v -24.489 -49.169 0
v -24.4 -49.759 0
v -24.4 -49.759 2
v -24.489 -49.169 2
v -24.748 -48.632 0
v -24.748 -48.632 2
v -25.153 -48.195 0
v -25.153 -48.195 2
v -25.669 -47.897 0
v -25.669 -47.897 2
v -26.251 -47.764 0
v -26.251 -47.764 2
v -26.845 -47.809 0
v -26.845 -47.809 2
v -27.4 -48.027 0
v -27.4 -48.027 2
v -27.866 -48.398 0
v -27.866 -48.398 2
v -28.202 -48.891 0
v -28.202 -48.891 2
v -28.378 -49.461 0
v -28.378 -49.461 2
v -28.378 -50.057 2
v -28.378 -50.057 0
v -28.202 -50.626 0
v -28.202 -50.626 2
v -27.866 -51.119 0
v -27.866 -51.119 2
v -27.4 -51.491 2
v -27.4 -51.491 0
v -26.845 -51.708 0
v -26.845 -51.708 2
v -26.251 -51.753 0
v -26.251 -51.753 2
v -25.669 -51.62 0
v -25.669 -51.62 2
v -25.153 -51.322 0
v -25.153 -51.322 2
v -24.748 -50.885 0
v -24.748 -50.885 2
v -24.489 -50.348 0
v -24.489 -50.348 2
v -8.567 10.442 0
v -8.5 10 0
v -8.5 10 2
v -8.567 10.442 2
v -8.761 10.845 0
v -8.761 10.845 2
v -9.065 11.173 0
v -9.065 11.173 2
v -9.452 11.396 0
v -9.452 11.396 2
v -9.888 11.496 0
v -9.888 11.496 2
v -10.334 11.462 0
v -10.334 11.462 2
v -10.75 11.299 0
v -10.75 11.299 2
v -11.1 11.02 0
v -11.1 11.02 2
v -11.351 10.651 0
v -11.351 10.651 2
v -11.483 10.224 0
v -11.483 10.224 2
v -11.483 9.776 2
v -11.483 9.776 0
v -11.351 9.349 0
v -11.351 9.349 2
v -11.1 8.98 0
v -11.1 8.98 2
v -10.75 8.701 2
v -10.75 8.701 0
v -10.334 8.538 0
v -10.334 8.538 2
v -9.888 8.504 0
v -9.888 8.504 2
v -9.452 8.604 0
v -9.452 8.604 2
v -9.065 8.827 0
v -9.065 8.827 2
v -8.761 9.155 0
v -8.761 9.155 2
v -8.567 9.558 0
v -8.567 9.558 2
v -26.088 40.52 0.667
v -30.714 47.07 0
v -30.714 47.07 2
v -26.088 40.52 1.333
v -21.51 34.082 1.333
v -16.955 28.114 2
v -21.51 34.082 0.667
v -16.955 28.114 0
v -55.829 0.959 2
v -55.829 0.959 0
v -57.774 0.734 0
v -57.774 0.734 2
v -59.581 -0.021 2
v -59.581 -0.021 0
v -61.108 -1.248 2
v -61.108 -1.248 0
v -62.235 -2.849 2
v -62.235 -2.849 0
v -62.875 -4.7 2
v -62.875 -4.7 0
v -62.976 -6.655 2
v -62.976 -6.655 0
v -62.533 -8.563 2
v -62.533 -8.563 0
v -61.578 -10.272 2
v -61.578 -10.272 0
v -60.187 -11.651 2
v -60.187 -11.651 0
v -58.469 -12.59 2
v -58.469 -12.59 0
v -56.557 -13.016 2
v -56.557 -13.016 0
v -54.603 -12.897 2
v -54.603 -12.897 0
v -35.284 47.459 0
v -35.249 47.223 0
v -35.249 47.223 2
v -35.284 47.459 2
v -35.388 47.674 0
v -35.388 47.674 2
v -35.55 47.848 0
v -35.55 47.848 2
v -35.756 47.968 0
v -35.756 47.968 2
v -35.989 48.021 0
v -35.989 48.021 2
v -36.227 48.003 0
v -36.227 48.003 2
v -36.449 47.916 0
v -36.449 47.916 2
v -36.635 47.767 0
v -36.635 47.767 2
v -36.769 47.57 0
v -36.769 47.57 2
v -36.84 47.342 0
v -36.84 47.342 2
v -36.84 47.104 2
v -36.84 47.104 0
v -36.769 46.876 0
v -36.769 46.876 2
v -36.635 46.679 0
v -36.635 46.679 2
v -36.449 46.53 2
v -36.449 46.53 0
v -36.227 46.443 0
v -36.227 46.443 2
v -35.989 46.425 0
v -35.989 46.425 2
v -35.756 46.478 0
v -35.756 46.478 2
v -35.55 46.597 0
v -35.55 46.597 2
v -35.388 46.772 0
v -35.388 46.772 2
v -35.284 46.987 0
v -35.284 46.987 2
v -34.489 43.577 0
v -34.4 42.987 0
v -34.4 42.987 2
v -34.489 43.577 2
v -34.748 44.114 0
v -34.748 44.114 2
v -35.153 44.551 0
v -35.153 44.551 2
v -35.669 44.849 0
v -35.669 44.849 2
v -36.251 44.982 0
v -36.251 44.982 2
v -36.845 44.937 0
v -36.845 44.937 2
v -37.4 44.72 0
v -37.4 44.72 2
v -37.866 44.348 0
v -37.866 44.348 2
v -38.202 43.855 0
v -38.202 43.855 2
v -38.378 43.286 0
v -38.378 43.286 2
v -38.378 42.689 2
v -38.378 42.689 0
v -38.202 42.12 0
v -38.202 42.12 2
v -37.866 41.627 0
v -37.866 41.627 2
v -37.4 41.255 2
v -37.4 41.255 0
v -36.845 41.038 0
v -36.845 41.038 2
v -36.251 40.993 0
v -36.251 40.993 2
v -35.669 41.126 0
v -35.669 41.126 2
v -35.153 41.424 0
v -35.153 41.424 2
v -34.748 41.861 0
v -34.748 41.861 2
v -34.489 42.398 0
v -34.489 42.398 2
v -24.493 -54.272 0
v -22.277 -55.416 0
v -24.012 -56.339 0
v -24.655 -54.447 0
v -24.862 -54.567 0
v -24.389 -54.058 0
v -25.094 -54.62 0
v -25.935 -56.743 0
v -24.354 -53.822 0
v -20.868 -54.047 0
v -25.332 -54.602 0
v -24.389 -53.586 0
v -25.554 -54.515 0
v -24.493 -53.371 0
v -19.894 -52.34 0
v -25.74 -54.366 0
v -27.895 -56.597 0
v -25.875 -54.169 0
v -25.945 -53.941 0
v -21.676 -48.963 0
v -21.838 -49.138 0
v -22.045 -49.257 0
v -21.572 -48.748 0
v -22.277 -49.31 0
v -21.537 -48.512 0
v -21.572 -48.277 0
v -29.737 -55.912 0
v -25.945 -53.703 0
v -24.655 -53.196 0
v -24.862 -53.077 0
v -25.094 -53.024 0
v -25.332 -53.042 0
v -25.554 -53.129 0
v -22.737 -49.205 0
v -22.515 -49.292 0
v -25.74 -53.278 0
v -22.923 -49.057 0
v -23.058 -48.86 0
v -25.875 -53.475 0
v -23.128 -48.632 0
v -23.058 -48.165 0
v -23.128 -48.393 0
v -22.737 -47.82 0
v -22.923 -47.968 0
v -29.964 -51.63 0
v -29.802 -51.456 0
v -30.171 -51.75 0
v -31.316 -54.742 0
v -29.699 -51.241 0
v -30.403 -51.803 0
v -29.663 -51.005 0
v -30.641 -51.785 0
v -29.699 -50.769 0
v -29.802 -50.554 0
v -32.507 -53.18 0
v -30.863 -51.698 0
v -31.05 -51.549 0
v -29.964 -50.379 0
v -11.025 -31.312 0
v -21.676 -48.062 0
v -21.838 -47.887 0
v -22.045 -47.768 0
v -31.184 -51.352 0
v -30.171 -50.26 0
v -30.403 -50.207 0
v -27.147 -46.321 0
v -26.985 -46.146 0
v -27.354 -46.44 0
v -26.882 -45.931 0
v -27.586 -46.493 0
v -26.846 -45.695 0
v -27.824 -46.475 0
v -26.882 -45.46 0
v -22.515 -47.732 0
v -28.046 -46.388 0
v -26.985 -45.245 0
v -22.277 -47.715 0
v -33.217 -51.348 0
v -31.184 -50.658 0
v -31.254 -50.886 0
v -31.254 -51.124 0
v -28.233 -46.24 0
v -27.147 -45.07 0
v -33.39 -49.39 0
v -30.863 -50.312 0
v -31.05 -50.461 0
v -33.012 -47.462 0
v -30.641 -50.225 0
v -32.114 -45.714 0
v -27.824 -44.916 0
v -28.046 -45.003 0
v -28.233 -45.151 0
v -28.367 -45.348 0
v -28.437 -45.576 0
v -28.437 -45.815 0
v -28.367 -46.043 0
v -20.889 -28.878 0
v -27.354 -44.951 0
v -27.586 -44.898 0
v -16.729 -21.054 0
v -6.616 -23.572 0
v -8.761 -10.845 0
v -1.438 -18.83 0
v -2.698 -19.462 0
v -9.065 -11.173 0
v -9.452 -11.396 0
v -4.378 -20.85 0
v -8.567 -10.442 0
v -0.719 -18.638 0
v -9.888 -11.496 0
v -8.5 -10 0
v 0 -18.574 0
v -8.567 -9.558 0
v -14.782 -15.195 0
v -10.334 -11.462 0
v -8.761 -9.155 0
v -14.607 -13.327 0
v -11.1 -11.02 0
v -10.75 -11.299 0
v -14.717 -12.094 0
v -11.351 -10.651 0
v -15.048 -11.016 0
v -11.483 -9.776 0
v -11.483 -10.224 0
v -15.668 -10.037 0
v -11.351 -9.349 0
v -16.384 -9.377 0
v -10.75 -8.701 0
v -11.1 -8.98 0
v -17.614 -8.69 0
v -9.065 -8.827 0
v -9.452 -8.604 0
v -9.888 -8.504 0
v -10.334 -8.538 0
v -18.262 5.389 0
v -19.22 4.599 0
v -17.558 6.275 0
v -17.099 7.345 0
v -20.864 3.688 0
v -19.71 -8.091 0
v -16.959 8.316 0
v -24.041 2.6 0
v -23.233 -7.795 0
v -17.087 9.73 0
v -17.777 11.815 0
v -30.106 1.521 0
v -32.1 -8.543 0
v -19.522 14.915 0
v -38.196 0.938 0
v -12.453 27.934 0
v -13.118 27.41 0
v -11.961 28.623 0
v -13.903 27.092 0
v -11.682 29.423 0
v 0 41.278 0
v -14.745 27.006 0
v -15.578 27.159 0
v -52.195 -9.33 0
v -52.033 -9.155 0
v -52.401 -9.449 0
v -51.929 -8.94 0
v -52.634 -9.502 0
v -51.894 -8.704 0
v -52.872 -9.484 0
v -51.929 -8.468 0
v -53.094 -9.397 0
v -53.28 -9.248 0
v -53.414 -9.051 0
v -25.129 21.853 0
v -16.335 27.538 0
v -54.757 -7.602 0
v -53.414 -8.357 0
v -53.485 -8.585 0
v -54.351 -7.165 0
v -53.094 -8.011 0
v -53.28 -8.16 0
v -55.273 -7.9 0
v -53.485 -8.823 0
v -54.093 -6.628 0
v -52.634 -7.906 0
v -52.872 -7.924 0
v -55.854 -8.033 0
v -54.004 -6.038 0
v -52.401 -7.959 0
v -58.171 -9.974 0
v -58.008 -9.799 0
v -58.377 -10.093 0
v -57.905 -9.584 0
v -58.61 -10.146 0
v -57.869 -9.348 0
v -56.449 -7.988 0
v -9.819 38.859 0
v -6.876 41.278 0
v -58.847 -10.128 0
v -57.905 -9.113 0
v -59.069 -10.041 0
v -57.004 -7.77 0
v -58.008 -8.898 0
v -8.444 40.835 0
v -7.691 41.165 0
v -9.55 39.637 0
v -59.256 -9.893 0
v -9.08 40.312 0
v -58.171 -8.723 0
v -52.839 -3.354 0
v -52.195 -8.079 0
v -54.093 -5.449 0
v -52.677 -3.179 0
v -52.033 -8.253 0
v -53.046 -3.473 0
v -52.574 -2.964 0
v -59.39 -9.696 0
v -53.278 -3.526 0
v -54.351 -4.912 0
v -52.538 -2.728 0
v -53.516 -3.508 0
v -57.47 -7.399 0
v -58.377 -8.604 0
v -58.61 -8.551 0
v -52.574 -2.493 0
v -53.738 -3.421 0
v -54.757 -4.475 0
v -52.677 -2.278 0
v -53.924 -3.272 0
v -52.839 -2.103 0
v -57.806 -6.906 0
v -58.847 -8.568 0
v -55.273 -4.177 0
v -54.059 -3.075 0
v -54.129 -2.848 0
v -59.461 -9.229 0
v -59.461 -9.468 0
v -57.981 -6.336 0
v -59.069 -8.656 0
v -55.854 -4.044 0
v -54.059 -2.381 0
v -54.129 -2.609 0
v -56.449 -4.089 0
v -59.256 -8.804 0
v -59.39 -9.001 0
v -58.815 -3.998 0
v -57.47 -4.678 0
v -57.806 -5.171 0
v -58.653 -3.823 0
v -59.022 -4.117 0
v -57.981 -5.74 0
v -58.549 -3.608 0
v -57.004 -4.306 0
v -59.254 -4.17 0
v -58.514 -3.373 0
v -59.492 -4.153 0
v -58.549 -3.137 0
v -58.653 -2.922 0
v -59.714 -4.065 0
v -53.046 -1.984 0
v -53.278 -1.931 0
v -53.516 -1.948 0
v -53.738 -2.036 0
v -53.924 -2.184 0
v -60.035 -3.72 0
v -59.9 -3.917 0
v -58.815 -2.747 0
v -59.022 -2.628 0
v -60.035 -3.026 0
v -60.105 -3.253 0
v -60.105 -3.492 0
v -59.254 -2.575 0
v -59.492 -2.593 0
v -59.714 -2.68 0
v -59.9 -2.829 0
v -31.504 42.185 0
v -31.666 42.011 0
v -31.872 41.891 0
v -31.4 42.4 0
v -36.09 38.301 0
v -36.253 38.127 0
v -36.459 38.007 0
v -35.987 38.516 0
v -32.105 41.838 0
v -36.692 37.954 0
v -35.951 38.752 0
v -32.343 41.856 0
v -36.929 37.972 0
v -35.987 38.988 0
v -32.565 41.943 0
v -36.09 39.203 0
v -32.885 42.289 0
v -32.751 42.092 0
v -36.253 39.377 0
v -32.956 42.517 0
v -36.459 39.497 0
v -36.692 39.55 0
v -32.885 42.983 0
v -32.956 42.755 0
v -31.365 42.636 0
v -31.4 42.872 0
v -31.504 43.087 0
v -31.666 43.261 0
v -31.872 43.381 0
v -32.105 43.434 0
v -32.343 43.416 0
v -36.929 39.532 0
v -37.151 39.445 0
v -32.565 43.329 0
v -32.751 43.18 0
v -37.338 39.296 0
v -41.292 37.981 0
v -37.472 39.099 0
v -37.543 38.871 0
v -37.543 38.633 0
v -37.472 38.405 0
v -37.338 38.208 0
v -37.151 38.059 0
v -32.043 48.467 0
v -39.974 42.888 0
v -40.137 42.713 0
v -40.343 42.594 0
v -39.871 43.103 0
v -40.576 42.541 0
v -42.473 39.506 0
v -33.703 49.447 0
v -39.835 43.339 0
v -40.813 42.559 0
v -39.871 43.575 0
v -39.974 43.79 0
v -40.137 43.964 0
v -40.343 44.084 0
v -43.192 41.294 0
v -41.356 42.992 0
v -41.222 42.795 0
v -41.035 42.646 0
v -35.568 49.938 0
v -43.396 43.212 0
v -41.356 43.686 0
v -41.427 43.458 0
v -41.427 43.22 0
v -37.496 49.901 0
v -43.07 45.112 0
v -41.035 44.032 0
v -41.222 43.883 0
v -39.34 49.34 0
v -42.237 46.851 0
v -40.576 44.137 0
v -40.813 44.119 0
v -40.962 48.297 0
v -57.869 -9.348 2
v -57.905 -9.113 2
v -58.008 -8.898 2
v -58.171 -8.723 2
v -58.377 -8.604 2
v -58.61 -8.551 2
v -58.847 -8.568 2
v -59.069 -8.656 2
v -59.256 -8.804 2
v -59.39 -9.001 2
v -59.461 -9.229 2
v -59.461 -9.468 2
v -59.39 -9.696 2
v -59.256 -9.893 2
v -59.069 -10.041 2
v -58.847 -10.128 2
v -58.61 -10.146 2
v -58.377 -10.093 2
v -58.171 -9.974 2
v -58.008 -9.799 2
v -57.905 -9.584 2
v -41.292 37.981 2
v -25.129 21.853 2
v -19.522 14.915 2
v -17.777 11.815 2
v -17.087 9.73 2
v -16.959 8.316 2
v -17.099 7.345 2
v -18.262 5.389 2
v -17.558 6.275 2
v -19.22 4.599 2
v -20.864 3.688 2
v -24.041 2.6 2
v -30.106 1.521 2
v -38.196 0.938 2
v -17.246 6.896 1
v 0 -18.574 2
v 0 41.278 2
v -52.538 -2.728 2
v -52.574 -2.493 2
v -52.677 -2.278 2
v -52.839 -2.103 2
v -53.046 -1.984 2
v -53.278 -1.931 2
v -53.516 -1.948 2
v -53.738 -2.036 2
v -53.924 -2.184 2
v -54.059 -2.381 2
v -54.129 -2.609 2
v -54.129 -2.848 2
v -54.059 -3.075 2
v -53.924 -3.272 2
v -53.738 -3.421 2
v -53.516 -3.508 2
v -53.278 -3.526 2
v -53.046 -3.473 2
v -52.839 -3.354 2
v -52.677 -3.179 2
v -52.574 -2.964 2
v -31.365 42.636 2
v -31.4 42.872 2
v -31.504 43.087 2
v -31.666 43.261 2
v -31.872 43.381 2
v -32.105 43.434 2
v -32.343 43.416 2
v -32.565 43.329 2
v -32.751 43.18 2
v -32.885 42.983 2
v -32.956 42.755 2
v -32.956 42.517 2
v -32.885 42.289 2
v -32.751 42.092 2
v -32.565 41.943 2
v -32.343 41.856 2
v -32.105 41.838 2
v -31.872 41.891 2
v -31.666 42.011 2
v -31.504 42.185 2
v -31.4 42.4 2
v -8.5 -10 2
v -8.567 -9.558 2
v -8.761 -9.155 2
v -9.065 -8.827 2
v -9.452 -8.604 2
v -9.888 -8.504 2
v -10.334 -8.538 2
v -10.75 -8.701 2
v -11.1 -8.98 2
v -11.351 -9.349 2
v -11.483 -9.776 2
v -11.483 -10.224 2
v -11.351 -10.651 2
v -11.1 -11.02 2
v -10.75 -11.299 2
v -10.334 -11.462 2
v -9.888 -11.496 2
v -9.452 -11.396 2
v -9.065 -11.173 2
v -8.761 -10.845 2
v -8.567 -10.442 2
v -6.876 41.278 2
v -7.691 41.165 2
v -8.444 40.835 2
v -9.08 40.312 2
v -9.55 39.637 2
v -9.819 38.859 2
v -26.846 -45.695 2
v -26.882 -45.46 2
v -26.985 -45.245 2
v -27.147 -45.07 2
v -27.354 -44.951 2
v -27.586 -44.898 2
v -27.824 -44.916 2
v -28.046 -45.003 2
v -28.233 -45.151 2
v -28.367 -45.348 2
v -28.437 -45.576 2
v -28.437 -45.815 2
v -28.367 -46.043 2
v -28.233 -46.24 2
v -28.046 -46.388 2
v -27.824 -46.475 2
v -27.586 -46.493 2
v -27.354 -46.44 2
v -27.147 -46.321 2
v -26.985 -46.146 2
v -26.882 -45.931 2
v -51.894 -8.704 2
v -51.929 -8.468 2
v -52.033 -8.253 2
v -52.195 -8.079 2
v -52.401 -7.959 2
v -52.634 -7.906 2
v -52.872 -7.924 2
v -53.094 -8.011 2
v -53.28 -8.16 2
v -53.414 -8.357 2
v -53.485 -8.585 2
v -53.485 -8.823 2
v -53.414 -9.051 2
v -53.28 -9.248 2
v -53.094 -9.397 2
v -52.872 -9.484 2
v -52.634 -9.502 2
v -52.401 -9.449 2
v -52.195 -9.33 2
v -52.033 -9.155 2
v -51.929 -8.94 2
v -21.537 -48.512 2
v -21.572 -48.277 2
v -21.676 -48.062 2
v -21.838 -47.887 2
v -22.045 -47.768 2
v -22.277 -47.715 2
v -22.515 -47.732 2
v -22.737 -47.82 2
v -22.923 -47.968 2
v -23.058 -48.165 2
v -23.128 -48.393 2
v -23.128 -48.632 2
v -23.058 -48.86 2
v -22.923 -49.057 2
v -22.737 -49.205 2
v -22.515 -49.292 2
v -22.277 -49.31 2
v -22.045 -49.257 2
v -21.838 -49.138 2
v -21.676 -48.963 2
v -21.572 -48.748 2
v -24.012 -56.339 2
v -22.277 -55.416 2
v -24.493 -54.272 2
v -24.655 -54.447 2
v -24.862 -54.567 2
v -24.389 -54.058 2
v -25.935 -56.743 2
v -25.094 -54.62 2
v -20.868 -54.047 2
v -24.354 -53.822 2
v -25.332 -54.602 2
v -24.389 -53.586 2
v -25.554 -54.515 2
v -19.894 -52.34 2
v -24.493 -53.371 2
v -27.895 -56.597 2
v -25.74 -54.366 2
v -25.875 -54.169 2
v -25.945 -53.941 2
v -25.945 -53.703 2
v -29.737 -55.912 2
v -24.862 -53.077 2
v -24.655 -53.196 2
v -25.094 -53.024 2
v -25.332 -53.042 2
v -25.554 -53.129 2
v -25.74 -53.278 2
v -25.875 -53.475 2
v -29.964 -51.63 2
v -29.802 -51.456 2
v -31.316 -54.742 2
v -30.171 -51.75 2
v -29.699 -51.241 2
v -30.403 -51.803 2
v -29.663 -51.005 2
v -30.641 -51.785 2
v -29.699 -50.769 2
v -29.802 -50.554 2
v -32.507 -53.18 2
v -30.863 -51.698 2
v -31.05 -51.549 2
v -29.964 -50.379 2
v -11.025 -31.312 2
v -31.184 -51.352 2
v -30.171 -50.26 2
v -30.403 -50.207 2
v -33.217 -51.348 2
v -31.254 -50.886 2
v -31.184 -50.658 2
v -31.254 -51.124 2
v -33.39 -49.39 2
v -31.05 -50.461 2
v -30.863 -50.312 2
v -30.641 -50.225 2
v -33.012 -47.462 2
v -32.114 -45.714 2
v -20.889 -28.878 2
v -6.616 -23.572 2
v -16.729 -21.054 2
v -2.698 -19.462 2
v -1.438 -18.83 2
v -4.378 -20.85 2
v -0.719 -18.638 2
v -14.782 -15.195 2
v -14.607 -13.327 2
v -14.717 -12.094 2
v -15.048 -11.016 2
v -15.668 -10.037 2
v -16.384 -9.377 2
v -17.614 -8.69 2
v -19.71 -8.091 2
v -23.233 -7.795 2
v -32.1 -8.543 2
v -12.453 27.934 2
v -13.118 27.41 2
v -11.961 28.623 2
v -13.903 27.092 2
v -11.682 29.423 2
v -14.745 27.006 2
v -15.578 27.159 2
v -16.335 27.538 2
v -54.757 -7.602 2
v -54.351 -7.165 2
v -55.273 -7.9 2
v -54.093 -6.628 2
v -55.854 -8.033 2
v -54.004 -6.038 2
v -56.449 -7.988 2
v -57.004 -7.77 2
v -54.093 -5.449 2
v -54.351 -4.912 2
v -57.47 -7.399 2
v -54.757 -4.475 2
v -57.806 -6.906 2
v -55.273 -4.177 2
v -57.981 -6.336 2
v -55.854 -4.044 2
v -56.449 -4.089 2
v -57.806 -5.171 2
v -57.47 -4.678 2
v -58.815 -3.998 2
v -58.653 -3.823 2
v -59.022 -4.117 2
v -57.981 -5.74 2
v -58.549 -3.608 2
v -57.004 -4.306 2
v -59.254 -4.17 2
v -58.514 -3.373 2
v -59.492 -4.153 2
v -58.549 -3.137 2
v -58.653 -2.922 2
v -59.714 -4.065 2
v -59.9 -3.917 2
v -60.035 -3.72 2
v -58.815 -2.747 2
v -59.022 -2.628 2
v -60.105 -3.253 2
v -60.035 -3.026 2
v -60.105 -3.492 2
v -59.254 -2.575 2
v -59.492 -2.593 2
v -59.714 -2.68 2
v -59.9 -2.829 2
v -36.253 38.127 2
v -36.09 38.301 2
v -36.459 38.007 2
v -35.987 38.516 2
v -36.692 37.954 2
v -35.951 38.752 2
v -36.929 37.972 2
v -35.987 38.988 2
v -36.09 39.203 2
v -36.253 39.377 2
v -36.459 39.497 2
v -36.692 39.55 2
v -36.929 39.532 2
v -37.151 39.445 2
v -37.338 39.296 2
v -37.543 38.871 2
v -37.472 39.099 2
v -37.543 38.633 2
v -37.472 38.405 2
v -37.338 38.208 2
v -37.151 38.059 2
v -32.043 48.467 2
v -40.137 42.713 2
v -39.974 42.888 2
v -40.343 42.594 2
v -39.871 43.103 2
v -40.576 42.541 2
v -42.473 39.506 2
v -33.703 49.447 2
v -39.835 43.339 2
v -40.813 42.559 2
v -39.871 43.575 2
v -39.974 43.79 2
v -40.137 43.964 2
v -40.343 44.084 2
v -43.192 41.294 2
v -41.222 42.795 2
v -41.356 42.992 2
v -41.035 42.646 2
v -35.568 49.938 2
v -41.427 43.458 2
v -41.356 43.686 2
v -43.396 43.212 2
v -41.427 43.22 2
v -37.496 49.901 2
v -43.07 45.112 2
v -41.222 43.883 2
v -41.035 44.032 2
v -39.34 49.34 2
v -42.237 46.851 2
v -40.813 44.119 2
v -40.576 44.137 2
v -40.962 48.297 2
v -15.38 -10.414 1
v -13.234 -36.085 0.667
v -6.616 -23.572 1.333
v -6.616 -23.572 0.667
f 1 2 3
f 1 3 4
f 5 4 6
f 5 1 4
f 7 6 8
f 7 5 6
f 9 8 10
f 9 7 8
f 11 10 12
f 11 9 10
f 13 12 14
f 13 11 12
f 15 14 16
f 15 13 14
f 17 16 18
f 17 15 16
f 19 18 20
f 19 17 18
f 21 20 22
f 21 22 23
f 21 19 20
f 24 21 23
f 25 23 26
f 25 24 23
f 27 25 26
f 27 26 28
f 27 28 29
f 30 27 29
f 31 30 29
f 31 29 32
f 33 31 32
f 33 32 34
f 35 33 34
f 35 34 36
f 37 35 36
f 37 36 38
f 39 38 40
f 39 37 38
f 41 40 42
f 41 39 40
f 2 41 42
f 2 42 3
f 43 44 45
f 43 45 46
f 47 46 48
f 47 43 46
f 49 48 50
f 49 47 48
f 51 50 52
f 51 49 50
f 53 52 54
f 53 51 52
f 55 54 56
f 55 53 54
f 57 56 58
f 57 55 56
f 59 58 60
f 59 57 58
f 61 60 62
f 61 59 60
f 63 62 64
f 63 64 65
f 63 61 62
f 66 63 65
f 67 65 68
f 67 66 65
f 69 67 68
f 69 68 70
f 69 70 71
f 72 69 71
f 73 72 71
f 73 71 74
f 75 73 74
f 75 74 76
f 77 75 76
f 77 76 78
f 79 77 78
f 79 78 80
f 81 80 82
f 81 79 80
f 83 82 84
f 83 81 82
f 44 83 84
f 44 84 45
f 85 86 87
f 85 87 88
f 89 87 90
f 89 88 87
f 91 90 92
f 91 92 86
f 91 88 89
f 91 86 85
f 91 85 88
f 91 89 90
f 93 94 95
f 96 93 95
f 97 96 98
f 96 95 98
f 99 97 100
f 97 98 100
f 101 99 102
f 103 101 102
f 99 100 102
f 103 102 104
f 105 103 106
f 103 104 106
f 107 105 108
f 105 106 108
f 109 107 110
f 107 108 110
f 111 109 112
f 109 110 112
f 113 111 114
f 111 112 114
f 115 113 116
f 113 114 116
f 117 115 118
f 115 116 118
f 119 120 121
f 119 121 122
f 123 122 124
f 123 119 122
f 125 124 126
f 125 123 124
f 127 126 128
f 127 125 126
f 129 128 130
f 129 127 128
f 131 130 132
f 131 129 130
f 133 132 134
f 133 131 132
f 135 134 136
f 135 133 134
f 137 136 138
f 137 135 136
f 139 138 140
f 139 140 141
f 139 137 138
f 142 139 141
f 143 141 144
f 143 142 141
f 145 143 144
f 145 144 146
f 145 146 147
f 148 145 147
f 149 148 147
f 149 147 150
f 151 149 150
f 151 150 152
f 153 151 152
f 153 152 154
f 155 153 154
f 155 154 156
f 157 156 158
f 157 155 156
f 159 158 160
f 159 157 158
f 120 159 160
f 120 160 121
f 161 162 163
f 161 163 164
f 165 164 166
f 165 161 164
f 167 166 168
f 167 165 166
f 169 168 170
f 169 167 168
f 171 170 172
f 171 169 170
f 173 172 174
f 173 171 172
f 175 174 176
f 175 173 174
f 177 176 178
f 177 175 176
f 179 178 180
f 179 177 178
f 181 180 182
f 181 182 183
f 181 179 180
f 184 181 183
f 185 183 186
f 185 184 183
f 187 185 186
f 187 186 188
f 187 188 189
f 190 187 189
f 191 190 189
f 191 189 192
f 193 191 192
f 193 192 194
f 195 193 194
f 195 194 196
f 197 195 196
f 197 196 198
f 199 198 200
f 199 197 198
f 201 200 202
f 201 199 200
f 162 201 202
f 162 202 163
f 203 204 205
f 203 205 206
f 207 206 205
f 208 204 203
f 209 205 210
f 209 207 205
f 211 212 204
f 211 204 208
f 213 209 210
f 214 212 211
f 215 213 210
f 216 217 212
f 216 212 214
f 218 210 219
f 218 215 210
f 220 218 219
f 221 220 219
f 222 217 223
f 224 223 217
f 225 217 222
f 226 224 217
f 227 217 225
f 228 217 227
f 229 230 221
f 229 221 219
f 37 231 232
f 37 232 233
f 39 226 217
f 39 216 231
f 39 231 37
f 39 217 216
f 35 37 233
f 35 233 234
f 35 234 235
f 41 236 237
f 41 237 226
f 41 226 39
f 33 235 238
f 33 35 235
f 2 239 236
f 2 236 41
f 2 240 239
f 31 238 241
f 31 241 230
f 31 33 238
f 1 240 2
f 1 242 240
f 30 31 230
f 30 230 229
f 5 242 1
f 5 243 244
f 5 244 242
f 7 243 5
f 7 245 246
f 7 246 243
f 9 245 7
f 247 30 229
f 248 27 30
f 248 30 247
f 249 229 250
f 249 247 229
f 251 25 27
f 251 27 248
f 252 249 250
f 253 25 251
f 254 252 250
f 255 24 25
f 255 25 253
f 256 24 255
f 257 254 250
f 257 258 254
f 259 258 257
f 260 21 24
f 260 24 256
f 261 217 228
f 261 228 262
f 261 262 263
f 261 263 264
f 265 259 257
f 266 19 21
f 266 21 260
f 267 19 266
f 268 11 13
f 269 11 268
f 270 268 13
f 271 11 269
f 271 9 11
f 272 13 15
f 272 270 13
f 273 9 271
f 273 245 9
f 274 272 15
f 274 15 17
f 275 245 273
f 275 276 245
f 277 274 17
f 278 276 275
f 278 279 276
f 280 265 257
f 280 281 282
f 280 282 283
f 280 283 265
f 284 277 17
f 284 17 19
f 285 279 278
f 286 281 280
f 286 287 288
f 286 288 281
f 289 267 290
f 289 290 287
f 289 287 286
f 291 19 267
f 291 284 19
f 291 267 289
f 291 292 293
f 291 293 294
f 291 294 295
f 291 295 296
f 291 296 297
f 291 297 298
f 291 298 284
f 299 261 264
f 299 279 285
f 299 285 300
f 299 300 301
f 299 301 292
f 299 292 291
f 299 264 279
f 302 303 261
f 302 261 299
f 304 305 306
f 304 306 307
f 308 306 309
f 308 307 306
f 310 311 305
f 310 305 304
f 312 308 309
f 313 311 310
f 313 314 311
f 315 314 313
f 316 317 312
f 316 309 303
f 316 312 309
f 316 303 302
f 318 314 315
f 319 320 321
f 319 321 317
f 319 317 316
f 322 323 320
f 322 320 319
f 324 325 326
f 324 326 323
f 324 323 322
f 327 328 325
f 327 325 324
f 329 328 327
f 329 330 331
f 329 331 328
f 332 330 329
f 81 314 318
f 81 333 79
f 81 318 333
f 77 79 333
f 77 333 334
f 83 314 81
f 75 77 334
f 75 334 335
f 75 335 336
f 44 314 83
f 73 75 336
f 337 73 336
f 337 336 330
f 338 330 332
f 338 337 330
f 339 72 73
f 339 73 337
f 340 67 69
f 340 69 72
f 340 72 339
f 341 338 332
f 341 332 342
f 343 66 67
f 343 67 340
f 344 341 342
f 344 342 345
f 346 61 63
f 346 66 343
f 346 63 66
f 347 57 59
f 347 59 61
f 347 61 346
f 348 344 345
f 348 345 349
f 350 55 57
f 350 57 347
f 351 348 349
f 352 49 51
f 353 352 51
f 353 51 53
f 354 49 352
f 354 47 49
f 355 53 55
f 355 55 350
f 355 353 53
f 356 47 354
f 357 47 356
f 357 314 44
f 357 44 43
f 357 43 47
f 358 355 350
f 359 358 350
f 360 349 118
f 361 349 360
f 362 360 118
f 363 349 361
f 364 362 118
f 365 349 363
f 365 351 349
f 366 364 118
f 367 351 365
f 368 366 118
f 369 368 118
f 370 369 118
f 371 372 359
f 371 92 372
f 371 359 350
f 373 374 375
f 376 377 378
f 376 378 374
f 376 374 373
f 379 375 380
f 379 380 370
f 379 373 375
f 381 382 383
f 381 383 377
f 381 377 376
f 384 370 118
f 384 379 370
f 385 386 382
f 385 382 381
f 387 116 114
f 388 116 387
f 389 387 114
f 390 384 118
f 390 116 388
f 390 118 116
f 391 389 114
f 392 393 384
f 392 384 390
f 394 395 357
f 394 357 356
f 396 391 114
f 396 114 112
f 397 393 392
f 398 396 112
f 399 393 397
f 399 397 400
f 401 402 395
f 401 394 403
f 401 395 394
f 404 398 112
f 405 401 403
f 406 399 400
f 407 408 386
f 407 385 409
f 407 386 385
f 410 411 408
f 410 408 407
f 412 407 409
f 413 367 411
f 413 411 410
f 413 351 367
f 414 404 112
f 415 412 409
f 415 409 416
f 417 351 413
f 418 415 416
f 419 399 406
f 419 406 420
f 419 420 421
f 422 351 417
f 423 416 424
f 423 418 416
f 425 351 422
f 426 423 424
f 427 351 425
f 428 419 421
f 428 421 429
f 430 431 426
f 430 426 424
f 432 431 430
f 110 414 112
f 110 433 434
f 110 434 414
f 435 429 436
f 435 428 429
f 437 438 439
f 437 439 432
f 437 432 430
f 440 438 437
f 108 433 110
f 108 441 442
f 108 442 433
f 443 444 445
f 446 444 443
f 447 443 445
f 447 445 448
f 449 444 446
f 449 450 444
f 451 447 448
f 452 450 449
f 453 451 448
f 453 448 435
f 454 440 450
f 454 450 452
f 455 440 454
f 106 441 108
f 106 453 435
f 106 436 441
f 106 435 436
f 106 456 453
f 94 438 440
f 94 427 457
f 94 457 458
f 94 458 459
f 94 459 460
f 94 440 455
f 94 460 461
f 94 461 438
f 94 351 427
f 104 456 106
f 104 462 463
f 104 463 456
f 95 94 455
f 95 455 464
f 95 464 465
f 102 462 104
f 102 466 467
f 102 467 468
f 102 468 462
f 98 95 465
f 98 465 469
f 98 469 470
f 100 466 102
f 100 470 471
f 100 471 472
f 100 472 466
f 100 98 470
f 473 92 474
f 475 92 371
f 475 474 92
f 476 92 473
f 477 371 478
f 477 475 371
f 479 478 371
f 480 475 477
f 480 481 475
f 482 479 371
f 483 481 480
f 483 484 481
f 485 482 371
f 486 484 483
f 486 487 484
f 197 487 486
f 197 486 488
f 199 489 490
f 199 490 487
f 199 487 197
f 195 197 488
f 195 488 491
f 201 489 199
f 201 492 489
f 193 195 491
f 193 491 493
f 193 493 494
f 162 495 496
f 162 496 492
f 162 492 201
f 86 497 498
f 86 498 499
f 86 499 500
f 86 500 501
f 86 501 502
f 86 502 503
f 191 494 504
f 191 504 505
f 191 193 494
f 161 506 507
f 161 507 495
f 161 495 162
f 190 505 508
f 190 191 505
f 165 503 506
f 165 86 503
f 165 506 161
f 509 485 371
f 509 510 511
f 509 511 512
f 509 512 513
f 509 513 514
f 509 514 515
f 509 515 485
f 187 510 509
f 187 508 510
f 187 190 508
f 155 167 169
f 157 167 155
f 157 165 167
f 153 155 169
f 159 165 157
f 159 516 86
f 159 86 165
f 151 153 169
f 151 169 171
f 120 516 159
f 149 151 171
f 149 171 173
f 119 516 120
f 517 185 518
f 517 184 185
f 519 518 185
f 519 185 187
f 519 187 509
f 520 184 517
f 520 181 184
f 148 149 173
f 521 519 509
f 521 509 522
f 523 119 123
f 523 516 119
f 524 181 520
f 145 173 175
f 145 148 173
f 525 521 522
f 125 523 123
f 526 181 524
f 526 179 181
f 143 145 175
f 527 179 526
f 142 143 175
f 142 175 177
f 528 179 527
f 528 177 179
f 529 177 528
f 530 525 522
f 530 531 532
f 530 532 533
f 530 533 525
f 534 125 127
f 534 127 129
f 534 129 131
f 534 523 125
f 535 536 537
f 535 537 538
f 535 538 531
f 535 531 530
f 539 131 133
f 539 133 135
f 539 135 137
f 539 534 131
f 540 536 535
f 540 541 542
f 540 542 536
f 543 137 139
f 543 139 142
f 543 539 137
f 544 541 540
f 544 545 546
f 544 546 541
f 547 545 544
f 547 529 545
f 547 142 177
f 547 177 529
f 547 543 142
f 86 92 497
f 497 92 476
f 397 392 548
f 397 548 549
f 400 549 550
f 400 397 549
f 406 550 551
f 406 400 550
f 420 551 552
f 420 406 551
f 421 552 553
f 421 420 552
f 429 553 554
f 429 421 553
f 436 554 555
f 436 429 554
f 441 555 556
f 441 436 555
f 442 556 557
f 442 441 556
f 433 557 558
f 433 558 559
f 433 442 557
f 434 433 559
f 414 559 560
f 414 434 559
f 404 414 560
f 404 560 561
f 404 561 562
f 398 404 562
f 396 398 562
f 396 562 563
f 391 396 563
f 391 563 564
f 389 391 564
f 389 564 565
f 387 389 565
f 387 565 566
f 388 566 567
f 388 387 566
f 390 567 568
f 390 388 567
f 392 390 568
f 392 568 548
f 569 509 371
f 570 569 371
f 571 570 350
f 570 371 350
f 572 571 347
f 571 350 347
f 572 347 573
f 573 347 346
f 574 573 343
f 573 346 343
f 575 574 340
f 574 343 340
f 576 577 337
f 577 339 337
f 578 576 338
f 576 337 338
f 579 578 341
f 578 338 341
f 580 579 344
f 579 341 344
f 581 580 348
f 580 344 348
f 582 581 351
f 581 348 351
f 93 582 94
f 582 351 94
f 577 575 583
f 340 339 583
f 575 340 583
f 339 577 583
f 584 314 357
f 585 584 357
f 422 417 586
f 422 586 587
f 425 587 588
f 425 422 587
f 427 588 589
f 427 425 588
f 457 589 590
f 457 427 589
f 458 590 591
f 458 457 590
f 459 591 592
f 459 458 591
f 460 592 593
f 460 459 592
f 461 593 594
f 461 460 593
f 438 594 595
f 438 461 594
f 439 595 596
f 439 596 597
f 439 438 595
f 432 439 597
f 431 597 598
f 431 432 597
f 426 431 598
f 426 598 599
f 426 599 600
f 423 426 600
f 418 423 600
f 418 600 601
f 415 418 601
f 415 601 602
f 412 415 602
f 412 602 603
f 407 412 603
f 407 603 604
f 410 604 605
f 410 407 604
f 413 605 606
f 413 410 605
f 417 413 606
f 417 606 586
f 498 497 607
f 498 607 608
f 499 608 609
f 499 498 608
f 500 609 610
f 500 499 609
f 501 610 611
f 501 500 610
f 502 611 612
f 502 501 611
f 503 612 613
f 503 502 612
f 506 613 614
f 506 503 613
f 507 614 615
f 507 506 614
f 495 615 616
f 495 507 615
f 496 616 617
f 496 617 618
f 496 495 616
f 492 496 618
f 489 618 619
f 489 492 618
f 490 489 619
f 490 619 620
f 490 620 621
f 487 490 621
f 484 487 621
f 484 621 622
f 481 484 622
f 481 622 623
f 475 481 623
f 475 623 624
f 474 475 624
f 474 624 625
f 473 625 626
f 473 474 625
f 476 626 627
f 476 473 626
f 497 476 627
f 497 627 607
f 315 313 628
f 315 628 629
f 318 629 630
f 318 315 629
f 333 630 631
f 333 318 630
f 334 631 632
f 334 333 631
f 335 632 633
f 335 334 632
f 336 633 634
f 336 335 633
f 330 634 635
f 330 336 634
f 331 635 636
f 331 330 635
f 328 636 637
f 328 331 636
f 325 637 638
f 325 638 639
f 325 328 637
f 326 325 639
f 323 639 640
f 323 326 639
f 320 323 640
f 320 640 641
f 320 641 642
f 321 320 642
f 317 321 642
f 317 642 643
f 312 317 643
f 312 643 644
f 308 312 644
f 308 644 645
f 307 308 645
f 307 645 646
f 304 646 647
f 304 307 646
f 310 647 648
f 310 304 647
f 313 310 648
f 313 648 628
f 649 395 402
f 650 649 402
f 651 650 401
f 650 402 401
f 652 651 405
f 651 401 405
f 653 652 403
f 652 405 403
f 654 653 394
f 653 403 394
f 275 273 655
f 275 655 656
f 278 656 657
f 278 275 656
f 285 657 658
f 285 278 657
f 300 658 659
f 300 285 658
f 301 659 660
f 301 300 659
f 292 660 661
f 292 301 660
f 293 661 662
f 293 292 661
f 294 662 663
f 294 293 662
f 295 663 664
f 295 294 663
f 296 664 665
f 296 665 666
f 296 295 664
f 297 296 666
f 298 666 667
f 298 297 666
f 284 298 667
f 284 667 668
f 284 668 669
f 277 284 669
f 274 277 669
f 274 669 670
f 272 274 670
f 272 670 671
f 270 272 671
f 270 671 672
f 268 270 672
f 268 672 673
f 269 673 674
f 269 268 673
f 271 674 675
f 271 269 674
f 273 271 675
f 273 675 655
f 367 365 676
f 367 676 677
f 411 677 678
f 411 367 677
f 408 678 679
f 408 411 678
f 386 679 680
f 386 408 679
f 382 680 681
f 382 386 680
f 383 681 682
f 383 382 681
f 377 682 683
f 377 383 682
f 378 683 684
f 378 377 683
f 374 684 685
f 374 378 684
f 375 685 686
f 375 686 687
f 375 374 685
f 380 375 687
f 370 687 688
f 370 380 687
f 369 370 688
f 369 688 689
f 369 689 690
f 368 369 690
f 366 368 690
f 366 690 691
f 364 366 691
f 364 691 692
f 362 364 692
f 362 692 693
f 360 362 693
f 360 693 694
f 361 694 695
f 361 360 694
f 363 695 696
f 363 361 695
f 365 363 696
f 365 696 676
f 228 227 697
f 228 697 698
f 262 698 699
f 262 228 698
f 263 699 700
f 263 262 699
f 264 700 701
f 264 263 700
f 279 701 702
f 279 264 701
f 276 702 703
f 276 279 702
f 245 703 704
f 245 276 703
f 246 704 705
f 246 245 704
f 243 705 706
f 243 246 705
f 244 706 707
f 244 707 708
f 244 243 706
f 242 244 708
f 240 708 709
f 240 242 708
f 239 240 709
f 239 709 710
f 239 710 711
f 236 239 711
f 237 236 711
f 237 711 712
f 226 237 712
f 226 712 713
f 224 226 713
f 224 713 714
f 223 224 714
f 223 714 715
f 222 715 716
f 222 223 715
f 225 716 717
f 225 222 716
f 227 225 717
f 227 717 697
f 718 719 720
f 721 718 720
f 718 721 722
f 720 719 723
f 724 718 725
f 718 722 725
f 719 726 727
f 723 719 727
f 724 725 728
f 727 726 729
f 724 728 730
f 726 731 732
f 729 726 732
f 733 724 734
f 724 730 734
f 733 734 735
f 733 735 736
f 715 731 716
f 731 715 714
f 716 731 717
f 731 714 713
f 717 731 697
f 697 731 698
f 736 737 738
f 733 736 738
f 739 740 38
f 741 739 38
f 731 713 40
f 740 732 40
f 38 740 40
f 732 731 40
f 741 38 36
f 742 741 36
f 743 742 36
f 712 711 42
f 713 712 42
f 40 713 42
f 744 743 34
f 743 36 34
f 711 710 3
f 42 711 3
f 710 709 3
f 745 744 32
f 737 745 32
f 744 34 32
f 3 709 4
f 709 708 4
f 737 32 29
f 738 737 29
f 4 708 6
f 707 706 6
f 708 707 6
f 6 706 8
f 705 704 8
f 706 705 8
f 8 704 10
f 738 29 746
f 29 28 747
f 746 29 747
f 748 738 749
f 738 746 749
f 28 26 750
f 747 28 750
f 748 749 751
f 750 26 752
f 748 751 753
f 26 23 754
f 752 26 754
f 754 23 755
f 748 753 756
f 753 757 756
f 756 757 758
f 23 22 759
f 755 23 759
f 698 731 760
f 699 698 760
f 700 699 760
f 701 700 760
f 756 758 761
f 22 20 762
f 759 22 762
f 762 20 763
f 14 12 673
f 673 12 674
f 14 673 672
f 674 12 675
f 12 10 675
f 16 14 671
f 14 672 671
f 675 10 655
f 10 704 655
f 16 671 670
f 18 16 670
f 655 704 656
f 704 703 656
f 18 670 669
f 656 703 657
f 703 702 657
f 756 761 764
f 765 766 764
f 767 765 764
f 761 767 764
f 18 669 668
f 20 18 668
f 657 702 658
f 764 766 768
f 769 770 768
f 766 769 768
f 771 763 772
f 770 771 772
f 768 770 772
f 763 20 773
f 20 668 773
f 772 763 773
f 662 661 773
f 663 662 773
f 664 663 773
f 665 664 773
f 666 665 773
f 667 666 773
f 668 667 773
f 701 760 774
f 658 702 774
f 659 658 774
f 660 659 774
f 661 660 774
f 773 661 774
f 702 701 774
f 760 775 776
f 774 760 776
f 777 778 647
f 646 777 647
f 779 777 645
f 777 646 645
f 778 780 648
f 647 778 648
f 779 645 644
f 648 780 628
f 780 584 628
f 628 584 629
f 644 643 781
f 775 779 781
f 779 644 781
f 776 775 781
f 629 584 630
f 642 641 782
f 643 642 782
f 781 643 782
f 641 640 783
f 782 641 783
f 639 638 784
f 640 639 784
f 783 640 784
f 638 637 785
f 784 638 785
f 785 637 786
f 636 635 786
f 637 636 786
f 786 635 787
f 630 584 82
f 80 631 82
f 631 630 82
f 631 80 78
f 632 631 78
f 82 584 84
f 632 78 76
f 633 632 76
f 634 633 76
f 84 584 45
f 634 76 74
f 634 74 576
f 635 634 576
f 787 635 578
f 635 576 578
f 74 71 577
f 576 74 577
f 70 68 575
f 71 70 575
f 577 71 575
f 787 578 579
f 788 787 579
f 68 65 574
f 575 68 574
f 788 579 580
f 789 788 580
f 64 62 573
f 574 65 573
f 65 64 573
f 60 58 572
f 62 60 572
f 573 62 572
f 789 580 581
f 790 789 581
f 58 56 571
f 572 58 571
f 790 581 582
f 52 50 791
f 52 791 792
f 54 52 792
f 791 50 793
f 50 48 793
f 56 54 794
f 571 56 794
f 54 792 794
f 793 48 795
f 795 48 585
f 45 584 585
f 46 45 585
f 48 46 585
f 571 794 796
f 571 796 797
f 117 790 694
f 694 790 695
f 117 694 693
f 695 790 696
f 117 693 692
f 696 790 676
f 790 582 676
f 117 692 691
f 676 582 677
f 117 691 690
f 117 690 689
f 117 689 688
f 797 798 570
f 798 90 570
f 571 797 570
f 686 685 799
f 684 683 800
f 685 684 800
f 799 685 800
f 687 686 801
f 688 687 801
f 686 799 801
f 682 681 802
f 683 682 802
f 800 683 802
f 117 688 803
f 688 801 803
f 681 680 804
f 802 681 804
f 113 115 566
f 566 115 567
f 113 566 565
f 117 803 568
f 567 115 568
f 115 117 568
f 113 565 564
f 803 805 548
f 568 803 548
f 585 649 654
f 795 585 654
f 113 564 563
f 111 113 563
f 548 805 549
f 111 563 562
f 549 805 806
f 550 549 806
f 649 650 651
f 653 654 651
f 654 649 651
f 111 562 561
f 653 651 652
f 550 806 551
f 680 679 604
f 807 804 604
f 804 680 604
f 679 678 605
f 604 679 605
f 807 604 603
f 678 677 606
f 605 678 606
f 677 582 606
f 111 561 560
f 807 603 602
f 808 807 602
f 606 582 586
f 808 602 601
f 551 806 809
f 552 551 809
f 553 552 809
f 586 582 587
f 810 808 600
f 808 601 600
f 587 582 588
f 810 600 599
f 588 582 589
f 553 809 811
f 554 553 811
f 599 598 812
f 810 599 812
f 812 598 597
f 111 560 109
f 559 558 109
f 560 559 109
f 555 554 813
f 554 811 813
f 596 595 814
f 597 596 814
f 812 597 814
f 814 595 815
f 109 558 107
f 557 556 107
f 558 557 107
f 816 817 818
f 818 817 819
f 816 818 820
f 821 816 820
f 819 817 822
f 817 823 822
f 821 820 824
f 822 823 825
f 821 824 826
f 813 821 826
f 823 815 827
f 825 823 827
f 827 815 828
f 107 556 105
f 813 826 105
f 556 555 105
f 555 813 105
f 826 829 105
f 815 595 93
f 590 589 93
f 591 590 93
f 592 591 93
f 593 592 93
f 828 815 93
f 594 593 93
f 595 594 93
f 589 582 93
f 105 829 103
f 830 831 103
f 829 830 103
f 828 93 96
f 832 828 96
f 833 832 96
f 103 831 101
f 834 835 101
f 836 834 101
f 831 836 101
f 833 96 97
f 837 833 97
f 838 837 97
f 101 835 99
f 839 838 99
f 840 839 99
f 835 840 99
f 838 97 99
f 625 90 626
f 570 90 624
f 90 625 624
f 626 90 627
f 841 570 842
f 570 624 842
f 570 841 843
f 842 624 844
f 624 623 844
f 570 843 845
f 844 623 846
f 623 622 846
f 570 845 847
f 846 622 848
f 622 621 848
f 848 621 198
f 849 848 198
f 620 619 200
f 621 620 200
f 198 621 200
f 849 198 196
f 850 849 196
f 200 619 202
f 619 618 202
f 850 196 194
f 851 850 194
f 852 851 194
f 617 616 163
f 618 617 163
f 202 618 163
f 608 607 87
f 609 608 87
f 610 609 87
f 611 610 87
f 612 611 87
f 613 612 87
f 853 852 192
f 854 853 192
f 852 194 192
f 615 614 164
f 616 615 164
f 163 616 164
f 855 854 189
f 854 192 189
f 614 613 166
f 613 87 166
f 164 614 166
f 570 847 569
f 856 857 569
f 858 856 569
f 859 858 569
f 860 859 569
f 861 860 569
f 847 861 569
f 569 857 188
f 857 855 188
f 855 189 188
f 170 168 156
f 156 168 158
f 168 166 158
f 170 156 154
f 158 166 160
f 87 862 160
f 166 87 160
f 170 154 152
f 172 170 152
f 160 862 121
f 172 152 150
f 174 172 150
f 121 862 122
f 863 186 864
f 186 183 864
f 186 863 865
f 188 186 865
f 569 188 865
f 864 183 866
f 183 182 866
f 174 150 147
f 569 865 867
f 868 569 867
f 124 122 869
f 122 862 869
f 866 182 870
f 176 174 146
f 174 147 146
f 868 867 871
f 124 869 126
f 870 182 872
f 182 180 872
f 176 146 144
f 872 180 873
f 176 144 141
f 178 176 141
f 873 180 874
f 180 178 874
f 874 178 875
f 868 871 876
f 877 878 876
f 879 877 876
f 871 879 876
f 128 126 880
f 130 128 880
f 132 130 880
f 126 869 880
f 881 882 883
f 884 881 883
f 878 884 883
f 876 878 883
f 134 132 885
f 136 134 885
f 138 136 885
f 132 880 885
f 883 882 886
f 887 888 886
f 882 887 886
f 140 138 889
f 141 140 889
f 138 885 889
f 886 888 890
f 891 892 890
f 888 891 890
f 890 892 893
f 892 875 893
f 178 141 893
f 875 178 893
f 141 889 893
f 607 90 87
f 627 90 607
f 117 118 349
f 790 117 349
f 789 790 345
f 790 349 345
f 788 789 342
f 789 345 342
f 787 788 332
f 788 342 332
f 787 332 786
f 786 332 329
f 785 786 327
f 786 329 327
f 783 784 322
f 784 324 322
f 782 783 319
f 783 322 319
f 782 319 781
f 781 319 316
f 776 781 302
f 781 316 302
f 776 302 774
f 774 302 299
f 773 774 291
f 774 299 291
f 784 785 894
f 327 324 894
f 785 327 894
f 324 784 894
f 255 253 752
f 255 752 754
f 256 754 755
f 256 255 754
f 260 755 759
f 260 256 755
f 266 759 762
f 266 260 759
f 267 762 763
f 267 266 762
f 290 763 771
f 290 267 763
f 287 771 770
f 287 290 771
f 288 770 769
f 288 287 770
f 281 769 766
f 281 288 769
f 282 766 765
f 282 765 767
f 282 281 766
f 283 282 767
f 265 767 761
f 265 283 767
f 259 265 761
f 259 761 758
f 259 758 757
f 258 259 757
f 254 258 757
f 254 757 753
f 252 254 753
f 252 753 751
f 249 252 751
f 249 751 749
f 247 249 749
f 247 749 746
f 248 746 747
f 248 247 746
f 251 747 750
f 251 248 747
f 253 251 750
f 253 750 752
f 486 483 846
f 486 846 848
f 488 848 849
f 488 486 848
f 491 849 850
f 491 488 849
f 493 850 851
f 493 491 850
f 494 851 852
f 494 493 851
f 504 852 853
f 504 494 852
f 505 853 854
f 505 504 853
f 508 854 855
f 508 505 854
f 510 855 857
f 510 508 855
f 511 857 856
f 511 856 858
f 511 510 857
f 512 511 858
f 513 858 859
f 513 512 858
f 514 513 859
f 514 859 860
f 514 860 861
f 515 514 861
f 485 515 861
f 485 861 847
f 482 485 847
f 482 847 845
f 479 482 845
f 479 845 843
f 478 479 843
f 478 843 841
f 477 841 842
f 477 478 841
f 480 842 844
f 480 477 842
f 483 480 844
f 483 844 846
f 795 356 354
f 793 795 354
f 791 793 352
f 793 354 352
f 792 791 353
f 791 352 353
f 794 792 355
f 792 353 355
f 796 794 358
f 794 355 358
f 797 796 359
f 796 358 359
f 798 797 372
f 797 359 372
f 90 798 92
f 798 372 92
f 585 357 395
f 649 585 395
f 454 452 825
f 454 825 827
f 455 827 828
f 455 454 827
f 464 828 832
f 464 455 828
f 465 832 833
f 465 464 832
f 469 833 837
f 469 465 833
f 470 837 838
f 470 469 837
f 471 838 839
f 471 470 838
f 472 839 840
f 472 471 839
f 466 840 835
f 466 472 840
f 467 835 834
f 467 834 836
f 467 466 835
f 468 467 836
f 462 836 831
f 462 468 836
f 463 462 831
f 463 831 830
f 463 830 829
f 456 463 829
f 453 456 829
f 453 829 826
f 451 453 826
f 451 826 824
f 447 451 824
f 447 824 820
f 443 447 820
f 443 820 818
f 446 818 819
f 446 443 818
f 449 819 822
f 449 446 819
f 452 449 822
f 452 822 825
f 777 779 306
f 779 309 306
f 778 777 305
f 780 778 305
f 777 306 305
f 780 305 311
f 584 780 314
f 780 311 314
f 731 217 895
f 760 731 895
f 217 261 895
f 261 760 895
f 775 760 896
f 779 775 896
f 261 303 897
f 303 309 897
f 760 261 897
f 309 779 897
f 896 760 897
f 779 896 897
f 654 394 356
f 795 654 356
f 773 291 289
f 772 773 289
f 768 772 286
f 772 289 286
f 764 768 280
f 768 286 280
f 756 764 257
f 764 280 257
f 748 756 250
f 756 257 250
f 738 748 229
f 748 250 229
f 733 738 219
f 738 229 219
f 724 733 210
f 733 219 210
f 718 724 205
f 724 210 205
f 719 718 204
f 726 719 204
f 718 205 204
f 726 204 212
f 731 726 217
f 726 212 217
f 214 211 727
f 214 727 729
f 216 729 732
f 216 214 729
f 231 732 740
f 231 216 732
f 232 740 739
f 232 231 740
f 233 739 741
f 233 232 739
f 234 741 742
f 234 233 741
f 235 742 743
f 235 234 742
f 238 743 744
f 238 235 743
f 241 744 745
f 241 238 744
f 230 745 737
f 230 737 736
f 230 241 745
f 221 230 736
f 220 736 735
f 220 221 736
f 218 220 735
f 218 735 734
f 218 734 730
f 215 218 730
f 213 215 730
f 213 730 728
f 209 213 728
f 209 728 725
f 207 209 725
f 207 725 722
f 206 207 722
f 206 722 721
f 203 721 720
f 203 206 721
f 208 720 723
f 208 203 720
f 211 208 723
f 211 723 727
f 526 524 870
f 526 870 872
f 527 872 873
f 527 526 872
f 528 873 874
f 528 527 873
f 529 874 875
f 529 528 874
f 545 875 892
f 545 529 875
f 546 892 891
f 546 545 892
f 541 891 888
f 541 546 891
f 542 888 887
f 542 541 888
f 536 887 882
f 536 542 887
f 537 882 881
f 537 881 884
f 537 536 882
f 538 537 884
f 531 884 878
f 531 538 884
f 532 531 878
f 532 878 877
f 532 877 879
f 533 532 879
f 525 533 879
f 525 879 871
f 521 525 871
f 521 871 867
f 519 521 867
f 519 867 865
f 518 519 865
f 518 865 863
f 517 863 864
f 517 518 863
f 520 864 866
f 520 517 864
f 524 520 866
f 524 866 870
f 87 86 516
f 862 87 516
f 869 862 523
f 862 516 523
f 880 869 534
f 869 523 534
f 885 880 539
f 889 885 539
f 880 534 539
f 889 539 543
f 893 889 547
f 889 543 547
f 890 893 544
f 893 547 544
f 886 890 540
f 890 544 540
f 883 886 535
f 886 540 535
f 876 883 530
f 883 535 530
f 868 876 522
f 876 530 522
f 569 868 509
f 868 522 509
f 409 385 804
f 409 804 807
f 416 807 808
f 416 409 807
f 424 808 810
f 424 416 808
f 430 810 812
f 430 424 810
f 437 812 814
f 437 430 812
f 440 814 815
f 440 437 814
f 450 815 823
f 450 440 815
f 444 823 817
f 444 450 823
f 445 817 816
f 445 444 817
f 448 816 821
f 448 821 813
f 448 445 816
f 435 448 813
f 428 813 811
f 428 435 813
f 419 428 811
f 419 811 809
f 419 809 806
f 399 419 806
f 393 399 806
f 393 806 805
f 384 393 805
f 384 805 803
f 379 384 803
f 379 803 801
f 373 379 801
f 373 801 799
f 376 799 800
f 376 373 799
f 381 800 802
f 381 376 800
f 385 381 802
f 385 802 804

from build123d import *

# Parameters (mm, degrees)
F0_R     = 0.8
F0_R_2   = 2
F0_R_3   = 1.5
F1_DEPTH = 2


with BuildPart() as f1:
    # F0 (on Top) → F1 (new body)
    with BuildSketch(Plane.XY):
        with BuildLine():
            add(Edge.make_bspline(
                [(-30.7139102544, 47.0701435694), (-26.0563740938, 40.5834526545), (-21.5054762535, 33.727348901), (-16.9553515314, 28.1144111899)],
                knots=[0, 0, 0, 0, 0.2252580977, 0.2252580977, 0.2252580977, 0.2252580977], degree=3))
            ThreePointArc((-30.7139102544, 47.0701435694), (-40.9618832344, 48.2968026675), (-41.2923553235, 37.980968676))
            add(Edge.make_bspline(
                [(-41.2923553235, 37.980968676), (-28.2909487562, 25.2759386837), (-1.3386977002, 0.9389418911), (-37.9847105167, 0.5142288136), (-55.8291501073, 0.959428143)],
                knots=[0, 0, 0, 0, 0.5008389877, 1, 1, 1, 1], degree=3))
            ThreePointArc((-55.8291501073, 0.959428143), (-62.9764861299, -6.6554726404), (-54.6028941093, -12.8967932407))
            add(Edge.make_bspline(
                [(-54.6028941093, -12.8967932407), (-36.6411490662, -9.2280647487), (-1.5554346637, -0.6002486072), (-21.8125444782, -31.161686503), (-32.1135049914, -45.7143883537)],
                knots=[0, 0, 0, 0, 0.5007521355, 1, 1, 1, 1], degree=3))
            ThreePointArc((-32.1135049914, -45.7143883537), (-29.7366902879, -55.9122023453), (-19.8935436127, -52.3404910086))
            add(Edge.make_bspline(
                [(-19.8935436127, -52.3404910086), (-13.1991680642, -35.4702565974), (-6.6281586733, -18.5581652323), (0, -18.5741237139)],
                knots=[0, 0, 0, 0, 0.5001011209, 0.5001011209, 0.5001011209, 0.5001011209], degree=3))
            Line((0, -18.5741237139), (0, 16.0465487335))
            add(Edge.make_bspline(
                [(-16.9553515314, 28.1144111899), (-11.3677507043, 21.221664878), (-5.7813157469, 16.2036250536), (0, 16.0465487335)],
                knots=[0.2252580977, 0.2252580977, 0.2252580977, 0.2252580977, 0.5018774016, 0.5018774016, 0.5018774016, 0.5018774016], degree=3))
        make_face()
        with Locations((-30.4631808179, -51.0048452558)):
            Circle(F0_R, mode=Mode.SUBTRACT)
        with Locations((-25.1537810623, -53.821807136)):
            Circle(F0_R, mode=Mode.SUBTRACT)
        with Locations((-26.4, -49.7586263181)):
            Circle(F0_R_2, mode=Mode.SUBTRACT)
        with Locations((-27.6462189377, -45.6954455001)):
            Circle(F0_R, mode=Mode.SUBTRACT)
        with Locations((-22.3368191821, -48.5124073803)):
            Circle(F0_R, mode=Mode.SUBTRACT)
        with Locations((-58.6694667332, -9.3484382842)):
            Circle(F0_R, mode=Mode.SUBTRACT)
        with Locations((-52.6936941752, -8.7041228837)):
            Circle(F0_R, mode=Mode.SUBTRACT)
        with Locations((-56.0037381545, -6.038394305)):
            Circle(F0_R_2, mode=Mode.SUBTRACT)
        with Locations((-10, -10)):
            Circle(F0_R_3, mode=Mode.SUBTRACT)
        with Locations((-59.3137821338, -3.3726657263)):
            Circle(F0_R, mode=Mode.SUBTRACT)
        with Locations((-53.3380095758, -2.7283503257)):
            Circle(F0_R, mode=Mode.SUBTRACT)
        with Locations((-10, 10)):
            Circle(F0_R_3, mode=Mode.SUBTRACT)
        with Locations((-36.7514506951, 38.752006823)):
            Circle(F0_R, mode=Mode.SUBTRACT)
        with Locations((-40.6354435906, 43.3389011087)):
            Circle(F0_R, mode=Mode.SUBTRACT)
        with Locations((-36.4, 42.9874504136)):
            Circle(F0_R_2, mode=Mode.SUBTRACT)
        with Locations((-32.1645564094, 42.6359997185)):
            Circle(F0_R, mode=Mode.SUBTRACT)
        with Locations((-36.0485493049, 47.2228940042)):
            Circle(F0_R, mode=Mode.SUBTRACT)
        with BuildLine():
            ThreePointArc((-11.6817113012, 29.4225234538), (-13.9026459734, 27.0918297248), (-16.9553515314, 28.1144111899))
            add(Edge.make_bspline(
                [(-16.9553515314, 28.1144111899), (-11.3677507043, 21.221664878), (-5.7813157469, 16.2036250536), (0, 16.0465487335)],
                knots=[0.2252580977, 0.2252580977, 0.2252580977, 0.2252580977, 0.5018774016, 0.5018774016, 0.5018774016, 0.5018774016], degree=3))
            Line((0, 16.0465487335), (0, 41.2778827355))
            Line((0, 41.2778827355), (-6.8755115637, 41.2778827355))
            ThreePointArc((-6.8755115637, 41.2778827355), (-8.7803475094, 40.5955539849), (-9.8187005677, 38.8589494156))
            Line((-9.8187005677, 38.8589494156), (-11.6817113012, 29.4225234538))
        make_face()
    extrude(amount=F1_DEPTH)


solid = f1.part
